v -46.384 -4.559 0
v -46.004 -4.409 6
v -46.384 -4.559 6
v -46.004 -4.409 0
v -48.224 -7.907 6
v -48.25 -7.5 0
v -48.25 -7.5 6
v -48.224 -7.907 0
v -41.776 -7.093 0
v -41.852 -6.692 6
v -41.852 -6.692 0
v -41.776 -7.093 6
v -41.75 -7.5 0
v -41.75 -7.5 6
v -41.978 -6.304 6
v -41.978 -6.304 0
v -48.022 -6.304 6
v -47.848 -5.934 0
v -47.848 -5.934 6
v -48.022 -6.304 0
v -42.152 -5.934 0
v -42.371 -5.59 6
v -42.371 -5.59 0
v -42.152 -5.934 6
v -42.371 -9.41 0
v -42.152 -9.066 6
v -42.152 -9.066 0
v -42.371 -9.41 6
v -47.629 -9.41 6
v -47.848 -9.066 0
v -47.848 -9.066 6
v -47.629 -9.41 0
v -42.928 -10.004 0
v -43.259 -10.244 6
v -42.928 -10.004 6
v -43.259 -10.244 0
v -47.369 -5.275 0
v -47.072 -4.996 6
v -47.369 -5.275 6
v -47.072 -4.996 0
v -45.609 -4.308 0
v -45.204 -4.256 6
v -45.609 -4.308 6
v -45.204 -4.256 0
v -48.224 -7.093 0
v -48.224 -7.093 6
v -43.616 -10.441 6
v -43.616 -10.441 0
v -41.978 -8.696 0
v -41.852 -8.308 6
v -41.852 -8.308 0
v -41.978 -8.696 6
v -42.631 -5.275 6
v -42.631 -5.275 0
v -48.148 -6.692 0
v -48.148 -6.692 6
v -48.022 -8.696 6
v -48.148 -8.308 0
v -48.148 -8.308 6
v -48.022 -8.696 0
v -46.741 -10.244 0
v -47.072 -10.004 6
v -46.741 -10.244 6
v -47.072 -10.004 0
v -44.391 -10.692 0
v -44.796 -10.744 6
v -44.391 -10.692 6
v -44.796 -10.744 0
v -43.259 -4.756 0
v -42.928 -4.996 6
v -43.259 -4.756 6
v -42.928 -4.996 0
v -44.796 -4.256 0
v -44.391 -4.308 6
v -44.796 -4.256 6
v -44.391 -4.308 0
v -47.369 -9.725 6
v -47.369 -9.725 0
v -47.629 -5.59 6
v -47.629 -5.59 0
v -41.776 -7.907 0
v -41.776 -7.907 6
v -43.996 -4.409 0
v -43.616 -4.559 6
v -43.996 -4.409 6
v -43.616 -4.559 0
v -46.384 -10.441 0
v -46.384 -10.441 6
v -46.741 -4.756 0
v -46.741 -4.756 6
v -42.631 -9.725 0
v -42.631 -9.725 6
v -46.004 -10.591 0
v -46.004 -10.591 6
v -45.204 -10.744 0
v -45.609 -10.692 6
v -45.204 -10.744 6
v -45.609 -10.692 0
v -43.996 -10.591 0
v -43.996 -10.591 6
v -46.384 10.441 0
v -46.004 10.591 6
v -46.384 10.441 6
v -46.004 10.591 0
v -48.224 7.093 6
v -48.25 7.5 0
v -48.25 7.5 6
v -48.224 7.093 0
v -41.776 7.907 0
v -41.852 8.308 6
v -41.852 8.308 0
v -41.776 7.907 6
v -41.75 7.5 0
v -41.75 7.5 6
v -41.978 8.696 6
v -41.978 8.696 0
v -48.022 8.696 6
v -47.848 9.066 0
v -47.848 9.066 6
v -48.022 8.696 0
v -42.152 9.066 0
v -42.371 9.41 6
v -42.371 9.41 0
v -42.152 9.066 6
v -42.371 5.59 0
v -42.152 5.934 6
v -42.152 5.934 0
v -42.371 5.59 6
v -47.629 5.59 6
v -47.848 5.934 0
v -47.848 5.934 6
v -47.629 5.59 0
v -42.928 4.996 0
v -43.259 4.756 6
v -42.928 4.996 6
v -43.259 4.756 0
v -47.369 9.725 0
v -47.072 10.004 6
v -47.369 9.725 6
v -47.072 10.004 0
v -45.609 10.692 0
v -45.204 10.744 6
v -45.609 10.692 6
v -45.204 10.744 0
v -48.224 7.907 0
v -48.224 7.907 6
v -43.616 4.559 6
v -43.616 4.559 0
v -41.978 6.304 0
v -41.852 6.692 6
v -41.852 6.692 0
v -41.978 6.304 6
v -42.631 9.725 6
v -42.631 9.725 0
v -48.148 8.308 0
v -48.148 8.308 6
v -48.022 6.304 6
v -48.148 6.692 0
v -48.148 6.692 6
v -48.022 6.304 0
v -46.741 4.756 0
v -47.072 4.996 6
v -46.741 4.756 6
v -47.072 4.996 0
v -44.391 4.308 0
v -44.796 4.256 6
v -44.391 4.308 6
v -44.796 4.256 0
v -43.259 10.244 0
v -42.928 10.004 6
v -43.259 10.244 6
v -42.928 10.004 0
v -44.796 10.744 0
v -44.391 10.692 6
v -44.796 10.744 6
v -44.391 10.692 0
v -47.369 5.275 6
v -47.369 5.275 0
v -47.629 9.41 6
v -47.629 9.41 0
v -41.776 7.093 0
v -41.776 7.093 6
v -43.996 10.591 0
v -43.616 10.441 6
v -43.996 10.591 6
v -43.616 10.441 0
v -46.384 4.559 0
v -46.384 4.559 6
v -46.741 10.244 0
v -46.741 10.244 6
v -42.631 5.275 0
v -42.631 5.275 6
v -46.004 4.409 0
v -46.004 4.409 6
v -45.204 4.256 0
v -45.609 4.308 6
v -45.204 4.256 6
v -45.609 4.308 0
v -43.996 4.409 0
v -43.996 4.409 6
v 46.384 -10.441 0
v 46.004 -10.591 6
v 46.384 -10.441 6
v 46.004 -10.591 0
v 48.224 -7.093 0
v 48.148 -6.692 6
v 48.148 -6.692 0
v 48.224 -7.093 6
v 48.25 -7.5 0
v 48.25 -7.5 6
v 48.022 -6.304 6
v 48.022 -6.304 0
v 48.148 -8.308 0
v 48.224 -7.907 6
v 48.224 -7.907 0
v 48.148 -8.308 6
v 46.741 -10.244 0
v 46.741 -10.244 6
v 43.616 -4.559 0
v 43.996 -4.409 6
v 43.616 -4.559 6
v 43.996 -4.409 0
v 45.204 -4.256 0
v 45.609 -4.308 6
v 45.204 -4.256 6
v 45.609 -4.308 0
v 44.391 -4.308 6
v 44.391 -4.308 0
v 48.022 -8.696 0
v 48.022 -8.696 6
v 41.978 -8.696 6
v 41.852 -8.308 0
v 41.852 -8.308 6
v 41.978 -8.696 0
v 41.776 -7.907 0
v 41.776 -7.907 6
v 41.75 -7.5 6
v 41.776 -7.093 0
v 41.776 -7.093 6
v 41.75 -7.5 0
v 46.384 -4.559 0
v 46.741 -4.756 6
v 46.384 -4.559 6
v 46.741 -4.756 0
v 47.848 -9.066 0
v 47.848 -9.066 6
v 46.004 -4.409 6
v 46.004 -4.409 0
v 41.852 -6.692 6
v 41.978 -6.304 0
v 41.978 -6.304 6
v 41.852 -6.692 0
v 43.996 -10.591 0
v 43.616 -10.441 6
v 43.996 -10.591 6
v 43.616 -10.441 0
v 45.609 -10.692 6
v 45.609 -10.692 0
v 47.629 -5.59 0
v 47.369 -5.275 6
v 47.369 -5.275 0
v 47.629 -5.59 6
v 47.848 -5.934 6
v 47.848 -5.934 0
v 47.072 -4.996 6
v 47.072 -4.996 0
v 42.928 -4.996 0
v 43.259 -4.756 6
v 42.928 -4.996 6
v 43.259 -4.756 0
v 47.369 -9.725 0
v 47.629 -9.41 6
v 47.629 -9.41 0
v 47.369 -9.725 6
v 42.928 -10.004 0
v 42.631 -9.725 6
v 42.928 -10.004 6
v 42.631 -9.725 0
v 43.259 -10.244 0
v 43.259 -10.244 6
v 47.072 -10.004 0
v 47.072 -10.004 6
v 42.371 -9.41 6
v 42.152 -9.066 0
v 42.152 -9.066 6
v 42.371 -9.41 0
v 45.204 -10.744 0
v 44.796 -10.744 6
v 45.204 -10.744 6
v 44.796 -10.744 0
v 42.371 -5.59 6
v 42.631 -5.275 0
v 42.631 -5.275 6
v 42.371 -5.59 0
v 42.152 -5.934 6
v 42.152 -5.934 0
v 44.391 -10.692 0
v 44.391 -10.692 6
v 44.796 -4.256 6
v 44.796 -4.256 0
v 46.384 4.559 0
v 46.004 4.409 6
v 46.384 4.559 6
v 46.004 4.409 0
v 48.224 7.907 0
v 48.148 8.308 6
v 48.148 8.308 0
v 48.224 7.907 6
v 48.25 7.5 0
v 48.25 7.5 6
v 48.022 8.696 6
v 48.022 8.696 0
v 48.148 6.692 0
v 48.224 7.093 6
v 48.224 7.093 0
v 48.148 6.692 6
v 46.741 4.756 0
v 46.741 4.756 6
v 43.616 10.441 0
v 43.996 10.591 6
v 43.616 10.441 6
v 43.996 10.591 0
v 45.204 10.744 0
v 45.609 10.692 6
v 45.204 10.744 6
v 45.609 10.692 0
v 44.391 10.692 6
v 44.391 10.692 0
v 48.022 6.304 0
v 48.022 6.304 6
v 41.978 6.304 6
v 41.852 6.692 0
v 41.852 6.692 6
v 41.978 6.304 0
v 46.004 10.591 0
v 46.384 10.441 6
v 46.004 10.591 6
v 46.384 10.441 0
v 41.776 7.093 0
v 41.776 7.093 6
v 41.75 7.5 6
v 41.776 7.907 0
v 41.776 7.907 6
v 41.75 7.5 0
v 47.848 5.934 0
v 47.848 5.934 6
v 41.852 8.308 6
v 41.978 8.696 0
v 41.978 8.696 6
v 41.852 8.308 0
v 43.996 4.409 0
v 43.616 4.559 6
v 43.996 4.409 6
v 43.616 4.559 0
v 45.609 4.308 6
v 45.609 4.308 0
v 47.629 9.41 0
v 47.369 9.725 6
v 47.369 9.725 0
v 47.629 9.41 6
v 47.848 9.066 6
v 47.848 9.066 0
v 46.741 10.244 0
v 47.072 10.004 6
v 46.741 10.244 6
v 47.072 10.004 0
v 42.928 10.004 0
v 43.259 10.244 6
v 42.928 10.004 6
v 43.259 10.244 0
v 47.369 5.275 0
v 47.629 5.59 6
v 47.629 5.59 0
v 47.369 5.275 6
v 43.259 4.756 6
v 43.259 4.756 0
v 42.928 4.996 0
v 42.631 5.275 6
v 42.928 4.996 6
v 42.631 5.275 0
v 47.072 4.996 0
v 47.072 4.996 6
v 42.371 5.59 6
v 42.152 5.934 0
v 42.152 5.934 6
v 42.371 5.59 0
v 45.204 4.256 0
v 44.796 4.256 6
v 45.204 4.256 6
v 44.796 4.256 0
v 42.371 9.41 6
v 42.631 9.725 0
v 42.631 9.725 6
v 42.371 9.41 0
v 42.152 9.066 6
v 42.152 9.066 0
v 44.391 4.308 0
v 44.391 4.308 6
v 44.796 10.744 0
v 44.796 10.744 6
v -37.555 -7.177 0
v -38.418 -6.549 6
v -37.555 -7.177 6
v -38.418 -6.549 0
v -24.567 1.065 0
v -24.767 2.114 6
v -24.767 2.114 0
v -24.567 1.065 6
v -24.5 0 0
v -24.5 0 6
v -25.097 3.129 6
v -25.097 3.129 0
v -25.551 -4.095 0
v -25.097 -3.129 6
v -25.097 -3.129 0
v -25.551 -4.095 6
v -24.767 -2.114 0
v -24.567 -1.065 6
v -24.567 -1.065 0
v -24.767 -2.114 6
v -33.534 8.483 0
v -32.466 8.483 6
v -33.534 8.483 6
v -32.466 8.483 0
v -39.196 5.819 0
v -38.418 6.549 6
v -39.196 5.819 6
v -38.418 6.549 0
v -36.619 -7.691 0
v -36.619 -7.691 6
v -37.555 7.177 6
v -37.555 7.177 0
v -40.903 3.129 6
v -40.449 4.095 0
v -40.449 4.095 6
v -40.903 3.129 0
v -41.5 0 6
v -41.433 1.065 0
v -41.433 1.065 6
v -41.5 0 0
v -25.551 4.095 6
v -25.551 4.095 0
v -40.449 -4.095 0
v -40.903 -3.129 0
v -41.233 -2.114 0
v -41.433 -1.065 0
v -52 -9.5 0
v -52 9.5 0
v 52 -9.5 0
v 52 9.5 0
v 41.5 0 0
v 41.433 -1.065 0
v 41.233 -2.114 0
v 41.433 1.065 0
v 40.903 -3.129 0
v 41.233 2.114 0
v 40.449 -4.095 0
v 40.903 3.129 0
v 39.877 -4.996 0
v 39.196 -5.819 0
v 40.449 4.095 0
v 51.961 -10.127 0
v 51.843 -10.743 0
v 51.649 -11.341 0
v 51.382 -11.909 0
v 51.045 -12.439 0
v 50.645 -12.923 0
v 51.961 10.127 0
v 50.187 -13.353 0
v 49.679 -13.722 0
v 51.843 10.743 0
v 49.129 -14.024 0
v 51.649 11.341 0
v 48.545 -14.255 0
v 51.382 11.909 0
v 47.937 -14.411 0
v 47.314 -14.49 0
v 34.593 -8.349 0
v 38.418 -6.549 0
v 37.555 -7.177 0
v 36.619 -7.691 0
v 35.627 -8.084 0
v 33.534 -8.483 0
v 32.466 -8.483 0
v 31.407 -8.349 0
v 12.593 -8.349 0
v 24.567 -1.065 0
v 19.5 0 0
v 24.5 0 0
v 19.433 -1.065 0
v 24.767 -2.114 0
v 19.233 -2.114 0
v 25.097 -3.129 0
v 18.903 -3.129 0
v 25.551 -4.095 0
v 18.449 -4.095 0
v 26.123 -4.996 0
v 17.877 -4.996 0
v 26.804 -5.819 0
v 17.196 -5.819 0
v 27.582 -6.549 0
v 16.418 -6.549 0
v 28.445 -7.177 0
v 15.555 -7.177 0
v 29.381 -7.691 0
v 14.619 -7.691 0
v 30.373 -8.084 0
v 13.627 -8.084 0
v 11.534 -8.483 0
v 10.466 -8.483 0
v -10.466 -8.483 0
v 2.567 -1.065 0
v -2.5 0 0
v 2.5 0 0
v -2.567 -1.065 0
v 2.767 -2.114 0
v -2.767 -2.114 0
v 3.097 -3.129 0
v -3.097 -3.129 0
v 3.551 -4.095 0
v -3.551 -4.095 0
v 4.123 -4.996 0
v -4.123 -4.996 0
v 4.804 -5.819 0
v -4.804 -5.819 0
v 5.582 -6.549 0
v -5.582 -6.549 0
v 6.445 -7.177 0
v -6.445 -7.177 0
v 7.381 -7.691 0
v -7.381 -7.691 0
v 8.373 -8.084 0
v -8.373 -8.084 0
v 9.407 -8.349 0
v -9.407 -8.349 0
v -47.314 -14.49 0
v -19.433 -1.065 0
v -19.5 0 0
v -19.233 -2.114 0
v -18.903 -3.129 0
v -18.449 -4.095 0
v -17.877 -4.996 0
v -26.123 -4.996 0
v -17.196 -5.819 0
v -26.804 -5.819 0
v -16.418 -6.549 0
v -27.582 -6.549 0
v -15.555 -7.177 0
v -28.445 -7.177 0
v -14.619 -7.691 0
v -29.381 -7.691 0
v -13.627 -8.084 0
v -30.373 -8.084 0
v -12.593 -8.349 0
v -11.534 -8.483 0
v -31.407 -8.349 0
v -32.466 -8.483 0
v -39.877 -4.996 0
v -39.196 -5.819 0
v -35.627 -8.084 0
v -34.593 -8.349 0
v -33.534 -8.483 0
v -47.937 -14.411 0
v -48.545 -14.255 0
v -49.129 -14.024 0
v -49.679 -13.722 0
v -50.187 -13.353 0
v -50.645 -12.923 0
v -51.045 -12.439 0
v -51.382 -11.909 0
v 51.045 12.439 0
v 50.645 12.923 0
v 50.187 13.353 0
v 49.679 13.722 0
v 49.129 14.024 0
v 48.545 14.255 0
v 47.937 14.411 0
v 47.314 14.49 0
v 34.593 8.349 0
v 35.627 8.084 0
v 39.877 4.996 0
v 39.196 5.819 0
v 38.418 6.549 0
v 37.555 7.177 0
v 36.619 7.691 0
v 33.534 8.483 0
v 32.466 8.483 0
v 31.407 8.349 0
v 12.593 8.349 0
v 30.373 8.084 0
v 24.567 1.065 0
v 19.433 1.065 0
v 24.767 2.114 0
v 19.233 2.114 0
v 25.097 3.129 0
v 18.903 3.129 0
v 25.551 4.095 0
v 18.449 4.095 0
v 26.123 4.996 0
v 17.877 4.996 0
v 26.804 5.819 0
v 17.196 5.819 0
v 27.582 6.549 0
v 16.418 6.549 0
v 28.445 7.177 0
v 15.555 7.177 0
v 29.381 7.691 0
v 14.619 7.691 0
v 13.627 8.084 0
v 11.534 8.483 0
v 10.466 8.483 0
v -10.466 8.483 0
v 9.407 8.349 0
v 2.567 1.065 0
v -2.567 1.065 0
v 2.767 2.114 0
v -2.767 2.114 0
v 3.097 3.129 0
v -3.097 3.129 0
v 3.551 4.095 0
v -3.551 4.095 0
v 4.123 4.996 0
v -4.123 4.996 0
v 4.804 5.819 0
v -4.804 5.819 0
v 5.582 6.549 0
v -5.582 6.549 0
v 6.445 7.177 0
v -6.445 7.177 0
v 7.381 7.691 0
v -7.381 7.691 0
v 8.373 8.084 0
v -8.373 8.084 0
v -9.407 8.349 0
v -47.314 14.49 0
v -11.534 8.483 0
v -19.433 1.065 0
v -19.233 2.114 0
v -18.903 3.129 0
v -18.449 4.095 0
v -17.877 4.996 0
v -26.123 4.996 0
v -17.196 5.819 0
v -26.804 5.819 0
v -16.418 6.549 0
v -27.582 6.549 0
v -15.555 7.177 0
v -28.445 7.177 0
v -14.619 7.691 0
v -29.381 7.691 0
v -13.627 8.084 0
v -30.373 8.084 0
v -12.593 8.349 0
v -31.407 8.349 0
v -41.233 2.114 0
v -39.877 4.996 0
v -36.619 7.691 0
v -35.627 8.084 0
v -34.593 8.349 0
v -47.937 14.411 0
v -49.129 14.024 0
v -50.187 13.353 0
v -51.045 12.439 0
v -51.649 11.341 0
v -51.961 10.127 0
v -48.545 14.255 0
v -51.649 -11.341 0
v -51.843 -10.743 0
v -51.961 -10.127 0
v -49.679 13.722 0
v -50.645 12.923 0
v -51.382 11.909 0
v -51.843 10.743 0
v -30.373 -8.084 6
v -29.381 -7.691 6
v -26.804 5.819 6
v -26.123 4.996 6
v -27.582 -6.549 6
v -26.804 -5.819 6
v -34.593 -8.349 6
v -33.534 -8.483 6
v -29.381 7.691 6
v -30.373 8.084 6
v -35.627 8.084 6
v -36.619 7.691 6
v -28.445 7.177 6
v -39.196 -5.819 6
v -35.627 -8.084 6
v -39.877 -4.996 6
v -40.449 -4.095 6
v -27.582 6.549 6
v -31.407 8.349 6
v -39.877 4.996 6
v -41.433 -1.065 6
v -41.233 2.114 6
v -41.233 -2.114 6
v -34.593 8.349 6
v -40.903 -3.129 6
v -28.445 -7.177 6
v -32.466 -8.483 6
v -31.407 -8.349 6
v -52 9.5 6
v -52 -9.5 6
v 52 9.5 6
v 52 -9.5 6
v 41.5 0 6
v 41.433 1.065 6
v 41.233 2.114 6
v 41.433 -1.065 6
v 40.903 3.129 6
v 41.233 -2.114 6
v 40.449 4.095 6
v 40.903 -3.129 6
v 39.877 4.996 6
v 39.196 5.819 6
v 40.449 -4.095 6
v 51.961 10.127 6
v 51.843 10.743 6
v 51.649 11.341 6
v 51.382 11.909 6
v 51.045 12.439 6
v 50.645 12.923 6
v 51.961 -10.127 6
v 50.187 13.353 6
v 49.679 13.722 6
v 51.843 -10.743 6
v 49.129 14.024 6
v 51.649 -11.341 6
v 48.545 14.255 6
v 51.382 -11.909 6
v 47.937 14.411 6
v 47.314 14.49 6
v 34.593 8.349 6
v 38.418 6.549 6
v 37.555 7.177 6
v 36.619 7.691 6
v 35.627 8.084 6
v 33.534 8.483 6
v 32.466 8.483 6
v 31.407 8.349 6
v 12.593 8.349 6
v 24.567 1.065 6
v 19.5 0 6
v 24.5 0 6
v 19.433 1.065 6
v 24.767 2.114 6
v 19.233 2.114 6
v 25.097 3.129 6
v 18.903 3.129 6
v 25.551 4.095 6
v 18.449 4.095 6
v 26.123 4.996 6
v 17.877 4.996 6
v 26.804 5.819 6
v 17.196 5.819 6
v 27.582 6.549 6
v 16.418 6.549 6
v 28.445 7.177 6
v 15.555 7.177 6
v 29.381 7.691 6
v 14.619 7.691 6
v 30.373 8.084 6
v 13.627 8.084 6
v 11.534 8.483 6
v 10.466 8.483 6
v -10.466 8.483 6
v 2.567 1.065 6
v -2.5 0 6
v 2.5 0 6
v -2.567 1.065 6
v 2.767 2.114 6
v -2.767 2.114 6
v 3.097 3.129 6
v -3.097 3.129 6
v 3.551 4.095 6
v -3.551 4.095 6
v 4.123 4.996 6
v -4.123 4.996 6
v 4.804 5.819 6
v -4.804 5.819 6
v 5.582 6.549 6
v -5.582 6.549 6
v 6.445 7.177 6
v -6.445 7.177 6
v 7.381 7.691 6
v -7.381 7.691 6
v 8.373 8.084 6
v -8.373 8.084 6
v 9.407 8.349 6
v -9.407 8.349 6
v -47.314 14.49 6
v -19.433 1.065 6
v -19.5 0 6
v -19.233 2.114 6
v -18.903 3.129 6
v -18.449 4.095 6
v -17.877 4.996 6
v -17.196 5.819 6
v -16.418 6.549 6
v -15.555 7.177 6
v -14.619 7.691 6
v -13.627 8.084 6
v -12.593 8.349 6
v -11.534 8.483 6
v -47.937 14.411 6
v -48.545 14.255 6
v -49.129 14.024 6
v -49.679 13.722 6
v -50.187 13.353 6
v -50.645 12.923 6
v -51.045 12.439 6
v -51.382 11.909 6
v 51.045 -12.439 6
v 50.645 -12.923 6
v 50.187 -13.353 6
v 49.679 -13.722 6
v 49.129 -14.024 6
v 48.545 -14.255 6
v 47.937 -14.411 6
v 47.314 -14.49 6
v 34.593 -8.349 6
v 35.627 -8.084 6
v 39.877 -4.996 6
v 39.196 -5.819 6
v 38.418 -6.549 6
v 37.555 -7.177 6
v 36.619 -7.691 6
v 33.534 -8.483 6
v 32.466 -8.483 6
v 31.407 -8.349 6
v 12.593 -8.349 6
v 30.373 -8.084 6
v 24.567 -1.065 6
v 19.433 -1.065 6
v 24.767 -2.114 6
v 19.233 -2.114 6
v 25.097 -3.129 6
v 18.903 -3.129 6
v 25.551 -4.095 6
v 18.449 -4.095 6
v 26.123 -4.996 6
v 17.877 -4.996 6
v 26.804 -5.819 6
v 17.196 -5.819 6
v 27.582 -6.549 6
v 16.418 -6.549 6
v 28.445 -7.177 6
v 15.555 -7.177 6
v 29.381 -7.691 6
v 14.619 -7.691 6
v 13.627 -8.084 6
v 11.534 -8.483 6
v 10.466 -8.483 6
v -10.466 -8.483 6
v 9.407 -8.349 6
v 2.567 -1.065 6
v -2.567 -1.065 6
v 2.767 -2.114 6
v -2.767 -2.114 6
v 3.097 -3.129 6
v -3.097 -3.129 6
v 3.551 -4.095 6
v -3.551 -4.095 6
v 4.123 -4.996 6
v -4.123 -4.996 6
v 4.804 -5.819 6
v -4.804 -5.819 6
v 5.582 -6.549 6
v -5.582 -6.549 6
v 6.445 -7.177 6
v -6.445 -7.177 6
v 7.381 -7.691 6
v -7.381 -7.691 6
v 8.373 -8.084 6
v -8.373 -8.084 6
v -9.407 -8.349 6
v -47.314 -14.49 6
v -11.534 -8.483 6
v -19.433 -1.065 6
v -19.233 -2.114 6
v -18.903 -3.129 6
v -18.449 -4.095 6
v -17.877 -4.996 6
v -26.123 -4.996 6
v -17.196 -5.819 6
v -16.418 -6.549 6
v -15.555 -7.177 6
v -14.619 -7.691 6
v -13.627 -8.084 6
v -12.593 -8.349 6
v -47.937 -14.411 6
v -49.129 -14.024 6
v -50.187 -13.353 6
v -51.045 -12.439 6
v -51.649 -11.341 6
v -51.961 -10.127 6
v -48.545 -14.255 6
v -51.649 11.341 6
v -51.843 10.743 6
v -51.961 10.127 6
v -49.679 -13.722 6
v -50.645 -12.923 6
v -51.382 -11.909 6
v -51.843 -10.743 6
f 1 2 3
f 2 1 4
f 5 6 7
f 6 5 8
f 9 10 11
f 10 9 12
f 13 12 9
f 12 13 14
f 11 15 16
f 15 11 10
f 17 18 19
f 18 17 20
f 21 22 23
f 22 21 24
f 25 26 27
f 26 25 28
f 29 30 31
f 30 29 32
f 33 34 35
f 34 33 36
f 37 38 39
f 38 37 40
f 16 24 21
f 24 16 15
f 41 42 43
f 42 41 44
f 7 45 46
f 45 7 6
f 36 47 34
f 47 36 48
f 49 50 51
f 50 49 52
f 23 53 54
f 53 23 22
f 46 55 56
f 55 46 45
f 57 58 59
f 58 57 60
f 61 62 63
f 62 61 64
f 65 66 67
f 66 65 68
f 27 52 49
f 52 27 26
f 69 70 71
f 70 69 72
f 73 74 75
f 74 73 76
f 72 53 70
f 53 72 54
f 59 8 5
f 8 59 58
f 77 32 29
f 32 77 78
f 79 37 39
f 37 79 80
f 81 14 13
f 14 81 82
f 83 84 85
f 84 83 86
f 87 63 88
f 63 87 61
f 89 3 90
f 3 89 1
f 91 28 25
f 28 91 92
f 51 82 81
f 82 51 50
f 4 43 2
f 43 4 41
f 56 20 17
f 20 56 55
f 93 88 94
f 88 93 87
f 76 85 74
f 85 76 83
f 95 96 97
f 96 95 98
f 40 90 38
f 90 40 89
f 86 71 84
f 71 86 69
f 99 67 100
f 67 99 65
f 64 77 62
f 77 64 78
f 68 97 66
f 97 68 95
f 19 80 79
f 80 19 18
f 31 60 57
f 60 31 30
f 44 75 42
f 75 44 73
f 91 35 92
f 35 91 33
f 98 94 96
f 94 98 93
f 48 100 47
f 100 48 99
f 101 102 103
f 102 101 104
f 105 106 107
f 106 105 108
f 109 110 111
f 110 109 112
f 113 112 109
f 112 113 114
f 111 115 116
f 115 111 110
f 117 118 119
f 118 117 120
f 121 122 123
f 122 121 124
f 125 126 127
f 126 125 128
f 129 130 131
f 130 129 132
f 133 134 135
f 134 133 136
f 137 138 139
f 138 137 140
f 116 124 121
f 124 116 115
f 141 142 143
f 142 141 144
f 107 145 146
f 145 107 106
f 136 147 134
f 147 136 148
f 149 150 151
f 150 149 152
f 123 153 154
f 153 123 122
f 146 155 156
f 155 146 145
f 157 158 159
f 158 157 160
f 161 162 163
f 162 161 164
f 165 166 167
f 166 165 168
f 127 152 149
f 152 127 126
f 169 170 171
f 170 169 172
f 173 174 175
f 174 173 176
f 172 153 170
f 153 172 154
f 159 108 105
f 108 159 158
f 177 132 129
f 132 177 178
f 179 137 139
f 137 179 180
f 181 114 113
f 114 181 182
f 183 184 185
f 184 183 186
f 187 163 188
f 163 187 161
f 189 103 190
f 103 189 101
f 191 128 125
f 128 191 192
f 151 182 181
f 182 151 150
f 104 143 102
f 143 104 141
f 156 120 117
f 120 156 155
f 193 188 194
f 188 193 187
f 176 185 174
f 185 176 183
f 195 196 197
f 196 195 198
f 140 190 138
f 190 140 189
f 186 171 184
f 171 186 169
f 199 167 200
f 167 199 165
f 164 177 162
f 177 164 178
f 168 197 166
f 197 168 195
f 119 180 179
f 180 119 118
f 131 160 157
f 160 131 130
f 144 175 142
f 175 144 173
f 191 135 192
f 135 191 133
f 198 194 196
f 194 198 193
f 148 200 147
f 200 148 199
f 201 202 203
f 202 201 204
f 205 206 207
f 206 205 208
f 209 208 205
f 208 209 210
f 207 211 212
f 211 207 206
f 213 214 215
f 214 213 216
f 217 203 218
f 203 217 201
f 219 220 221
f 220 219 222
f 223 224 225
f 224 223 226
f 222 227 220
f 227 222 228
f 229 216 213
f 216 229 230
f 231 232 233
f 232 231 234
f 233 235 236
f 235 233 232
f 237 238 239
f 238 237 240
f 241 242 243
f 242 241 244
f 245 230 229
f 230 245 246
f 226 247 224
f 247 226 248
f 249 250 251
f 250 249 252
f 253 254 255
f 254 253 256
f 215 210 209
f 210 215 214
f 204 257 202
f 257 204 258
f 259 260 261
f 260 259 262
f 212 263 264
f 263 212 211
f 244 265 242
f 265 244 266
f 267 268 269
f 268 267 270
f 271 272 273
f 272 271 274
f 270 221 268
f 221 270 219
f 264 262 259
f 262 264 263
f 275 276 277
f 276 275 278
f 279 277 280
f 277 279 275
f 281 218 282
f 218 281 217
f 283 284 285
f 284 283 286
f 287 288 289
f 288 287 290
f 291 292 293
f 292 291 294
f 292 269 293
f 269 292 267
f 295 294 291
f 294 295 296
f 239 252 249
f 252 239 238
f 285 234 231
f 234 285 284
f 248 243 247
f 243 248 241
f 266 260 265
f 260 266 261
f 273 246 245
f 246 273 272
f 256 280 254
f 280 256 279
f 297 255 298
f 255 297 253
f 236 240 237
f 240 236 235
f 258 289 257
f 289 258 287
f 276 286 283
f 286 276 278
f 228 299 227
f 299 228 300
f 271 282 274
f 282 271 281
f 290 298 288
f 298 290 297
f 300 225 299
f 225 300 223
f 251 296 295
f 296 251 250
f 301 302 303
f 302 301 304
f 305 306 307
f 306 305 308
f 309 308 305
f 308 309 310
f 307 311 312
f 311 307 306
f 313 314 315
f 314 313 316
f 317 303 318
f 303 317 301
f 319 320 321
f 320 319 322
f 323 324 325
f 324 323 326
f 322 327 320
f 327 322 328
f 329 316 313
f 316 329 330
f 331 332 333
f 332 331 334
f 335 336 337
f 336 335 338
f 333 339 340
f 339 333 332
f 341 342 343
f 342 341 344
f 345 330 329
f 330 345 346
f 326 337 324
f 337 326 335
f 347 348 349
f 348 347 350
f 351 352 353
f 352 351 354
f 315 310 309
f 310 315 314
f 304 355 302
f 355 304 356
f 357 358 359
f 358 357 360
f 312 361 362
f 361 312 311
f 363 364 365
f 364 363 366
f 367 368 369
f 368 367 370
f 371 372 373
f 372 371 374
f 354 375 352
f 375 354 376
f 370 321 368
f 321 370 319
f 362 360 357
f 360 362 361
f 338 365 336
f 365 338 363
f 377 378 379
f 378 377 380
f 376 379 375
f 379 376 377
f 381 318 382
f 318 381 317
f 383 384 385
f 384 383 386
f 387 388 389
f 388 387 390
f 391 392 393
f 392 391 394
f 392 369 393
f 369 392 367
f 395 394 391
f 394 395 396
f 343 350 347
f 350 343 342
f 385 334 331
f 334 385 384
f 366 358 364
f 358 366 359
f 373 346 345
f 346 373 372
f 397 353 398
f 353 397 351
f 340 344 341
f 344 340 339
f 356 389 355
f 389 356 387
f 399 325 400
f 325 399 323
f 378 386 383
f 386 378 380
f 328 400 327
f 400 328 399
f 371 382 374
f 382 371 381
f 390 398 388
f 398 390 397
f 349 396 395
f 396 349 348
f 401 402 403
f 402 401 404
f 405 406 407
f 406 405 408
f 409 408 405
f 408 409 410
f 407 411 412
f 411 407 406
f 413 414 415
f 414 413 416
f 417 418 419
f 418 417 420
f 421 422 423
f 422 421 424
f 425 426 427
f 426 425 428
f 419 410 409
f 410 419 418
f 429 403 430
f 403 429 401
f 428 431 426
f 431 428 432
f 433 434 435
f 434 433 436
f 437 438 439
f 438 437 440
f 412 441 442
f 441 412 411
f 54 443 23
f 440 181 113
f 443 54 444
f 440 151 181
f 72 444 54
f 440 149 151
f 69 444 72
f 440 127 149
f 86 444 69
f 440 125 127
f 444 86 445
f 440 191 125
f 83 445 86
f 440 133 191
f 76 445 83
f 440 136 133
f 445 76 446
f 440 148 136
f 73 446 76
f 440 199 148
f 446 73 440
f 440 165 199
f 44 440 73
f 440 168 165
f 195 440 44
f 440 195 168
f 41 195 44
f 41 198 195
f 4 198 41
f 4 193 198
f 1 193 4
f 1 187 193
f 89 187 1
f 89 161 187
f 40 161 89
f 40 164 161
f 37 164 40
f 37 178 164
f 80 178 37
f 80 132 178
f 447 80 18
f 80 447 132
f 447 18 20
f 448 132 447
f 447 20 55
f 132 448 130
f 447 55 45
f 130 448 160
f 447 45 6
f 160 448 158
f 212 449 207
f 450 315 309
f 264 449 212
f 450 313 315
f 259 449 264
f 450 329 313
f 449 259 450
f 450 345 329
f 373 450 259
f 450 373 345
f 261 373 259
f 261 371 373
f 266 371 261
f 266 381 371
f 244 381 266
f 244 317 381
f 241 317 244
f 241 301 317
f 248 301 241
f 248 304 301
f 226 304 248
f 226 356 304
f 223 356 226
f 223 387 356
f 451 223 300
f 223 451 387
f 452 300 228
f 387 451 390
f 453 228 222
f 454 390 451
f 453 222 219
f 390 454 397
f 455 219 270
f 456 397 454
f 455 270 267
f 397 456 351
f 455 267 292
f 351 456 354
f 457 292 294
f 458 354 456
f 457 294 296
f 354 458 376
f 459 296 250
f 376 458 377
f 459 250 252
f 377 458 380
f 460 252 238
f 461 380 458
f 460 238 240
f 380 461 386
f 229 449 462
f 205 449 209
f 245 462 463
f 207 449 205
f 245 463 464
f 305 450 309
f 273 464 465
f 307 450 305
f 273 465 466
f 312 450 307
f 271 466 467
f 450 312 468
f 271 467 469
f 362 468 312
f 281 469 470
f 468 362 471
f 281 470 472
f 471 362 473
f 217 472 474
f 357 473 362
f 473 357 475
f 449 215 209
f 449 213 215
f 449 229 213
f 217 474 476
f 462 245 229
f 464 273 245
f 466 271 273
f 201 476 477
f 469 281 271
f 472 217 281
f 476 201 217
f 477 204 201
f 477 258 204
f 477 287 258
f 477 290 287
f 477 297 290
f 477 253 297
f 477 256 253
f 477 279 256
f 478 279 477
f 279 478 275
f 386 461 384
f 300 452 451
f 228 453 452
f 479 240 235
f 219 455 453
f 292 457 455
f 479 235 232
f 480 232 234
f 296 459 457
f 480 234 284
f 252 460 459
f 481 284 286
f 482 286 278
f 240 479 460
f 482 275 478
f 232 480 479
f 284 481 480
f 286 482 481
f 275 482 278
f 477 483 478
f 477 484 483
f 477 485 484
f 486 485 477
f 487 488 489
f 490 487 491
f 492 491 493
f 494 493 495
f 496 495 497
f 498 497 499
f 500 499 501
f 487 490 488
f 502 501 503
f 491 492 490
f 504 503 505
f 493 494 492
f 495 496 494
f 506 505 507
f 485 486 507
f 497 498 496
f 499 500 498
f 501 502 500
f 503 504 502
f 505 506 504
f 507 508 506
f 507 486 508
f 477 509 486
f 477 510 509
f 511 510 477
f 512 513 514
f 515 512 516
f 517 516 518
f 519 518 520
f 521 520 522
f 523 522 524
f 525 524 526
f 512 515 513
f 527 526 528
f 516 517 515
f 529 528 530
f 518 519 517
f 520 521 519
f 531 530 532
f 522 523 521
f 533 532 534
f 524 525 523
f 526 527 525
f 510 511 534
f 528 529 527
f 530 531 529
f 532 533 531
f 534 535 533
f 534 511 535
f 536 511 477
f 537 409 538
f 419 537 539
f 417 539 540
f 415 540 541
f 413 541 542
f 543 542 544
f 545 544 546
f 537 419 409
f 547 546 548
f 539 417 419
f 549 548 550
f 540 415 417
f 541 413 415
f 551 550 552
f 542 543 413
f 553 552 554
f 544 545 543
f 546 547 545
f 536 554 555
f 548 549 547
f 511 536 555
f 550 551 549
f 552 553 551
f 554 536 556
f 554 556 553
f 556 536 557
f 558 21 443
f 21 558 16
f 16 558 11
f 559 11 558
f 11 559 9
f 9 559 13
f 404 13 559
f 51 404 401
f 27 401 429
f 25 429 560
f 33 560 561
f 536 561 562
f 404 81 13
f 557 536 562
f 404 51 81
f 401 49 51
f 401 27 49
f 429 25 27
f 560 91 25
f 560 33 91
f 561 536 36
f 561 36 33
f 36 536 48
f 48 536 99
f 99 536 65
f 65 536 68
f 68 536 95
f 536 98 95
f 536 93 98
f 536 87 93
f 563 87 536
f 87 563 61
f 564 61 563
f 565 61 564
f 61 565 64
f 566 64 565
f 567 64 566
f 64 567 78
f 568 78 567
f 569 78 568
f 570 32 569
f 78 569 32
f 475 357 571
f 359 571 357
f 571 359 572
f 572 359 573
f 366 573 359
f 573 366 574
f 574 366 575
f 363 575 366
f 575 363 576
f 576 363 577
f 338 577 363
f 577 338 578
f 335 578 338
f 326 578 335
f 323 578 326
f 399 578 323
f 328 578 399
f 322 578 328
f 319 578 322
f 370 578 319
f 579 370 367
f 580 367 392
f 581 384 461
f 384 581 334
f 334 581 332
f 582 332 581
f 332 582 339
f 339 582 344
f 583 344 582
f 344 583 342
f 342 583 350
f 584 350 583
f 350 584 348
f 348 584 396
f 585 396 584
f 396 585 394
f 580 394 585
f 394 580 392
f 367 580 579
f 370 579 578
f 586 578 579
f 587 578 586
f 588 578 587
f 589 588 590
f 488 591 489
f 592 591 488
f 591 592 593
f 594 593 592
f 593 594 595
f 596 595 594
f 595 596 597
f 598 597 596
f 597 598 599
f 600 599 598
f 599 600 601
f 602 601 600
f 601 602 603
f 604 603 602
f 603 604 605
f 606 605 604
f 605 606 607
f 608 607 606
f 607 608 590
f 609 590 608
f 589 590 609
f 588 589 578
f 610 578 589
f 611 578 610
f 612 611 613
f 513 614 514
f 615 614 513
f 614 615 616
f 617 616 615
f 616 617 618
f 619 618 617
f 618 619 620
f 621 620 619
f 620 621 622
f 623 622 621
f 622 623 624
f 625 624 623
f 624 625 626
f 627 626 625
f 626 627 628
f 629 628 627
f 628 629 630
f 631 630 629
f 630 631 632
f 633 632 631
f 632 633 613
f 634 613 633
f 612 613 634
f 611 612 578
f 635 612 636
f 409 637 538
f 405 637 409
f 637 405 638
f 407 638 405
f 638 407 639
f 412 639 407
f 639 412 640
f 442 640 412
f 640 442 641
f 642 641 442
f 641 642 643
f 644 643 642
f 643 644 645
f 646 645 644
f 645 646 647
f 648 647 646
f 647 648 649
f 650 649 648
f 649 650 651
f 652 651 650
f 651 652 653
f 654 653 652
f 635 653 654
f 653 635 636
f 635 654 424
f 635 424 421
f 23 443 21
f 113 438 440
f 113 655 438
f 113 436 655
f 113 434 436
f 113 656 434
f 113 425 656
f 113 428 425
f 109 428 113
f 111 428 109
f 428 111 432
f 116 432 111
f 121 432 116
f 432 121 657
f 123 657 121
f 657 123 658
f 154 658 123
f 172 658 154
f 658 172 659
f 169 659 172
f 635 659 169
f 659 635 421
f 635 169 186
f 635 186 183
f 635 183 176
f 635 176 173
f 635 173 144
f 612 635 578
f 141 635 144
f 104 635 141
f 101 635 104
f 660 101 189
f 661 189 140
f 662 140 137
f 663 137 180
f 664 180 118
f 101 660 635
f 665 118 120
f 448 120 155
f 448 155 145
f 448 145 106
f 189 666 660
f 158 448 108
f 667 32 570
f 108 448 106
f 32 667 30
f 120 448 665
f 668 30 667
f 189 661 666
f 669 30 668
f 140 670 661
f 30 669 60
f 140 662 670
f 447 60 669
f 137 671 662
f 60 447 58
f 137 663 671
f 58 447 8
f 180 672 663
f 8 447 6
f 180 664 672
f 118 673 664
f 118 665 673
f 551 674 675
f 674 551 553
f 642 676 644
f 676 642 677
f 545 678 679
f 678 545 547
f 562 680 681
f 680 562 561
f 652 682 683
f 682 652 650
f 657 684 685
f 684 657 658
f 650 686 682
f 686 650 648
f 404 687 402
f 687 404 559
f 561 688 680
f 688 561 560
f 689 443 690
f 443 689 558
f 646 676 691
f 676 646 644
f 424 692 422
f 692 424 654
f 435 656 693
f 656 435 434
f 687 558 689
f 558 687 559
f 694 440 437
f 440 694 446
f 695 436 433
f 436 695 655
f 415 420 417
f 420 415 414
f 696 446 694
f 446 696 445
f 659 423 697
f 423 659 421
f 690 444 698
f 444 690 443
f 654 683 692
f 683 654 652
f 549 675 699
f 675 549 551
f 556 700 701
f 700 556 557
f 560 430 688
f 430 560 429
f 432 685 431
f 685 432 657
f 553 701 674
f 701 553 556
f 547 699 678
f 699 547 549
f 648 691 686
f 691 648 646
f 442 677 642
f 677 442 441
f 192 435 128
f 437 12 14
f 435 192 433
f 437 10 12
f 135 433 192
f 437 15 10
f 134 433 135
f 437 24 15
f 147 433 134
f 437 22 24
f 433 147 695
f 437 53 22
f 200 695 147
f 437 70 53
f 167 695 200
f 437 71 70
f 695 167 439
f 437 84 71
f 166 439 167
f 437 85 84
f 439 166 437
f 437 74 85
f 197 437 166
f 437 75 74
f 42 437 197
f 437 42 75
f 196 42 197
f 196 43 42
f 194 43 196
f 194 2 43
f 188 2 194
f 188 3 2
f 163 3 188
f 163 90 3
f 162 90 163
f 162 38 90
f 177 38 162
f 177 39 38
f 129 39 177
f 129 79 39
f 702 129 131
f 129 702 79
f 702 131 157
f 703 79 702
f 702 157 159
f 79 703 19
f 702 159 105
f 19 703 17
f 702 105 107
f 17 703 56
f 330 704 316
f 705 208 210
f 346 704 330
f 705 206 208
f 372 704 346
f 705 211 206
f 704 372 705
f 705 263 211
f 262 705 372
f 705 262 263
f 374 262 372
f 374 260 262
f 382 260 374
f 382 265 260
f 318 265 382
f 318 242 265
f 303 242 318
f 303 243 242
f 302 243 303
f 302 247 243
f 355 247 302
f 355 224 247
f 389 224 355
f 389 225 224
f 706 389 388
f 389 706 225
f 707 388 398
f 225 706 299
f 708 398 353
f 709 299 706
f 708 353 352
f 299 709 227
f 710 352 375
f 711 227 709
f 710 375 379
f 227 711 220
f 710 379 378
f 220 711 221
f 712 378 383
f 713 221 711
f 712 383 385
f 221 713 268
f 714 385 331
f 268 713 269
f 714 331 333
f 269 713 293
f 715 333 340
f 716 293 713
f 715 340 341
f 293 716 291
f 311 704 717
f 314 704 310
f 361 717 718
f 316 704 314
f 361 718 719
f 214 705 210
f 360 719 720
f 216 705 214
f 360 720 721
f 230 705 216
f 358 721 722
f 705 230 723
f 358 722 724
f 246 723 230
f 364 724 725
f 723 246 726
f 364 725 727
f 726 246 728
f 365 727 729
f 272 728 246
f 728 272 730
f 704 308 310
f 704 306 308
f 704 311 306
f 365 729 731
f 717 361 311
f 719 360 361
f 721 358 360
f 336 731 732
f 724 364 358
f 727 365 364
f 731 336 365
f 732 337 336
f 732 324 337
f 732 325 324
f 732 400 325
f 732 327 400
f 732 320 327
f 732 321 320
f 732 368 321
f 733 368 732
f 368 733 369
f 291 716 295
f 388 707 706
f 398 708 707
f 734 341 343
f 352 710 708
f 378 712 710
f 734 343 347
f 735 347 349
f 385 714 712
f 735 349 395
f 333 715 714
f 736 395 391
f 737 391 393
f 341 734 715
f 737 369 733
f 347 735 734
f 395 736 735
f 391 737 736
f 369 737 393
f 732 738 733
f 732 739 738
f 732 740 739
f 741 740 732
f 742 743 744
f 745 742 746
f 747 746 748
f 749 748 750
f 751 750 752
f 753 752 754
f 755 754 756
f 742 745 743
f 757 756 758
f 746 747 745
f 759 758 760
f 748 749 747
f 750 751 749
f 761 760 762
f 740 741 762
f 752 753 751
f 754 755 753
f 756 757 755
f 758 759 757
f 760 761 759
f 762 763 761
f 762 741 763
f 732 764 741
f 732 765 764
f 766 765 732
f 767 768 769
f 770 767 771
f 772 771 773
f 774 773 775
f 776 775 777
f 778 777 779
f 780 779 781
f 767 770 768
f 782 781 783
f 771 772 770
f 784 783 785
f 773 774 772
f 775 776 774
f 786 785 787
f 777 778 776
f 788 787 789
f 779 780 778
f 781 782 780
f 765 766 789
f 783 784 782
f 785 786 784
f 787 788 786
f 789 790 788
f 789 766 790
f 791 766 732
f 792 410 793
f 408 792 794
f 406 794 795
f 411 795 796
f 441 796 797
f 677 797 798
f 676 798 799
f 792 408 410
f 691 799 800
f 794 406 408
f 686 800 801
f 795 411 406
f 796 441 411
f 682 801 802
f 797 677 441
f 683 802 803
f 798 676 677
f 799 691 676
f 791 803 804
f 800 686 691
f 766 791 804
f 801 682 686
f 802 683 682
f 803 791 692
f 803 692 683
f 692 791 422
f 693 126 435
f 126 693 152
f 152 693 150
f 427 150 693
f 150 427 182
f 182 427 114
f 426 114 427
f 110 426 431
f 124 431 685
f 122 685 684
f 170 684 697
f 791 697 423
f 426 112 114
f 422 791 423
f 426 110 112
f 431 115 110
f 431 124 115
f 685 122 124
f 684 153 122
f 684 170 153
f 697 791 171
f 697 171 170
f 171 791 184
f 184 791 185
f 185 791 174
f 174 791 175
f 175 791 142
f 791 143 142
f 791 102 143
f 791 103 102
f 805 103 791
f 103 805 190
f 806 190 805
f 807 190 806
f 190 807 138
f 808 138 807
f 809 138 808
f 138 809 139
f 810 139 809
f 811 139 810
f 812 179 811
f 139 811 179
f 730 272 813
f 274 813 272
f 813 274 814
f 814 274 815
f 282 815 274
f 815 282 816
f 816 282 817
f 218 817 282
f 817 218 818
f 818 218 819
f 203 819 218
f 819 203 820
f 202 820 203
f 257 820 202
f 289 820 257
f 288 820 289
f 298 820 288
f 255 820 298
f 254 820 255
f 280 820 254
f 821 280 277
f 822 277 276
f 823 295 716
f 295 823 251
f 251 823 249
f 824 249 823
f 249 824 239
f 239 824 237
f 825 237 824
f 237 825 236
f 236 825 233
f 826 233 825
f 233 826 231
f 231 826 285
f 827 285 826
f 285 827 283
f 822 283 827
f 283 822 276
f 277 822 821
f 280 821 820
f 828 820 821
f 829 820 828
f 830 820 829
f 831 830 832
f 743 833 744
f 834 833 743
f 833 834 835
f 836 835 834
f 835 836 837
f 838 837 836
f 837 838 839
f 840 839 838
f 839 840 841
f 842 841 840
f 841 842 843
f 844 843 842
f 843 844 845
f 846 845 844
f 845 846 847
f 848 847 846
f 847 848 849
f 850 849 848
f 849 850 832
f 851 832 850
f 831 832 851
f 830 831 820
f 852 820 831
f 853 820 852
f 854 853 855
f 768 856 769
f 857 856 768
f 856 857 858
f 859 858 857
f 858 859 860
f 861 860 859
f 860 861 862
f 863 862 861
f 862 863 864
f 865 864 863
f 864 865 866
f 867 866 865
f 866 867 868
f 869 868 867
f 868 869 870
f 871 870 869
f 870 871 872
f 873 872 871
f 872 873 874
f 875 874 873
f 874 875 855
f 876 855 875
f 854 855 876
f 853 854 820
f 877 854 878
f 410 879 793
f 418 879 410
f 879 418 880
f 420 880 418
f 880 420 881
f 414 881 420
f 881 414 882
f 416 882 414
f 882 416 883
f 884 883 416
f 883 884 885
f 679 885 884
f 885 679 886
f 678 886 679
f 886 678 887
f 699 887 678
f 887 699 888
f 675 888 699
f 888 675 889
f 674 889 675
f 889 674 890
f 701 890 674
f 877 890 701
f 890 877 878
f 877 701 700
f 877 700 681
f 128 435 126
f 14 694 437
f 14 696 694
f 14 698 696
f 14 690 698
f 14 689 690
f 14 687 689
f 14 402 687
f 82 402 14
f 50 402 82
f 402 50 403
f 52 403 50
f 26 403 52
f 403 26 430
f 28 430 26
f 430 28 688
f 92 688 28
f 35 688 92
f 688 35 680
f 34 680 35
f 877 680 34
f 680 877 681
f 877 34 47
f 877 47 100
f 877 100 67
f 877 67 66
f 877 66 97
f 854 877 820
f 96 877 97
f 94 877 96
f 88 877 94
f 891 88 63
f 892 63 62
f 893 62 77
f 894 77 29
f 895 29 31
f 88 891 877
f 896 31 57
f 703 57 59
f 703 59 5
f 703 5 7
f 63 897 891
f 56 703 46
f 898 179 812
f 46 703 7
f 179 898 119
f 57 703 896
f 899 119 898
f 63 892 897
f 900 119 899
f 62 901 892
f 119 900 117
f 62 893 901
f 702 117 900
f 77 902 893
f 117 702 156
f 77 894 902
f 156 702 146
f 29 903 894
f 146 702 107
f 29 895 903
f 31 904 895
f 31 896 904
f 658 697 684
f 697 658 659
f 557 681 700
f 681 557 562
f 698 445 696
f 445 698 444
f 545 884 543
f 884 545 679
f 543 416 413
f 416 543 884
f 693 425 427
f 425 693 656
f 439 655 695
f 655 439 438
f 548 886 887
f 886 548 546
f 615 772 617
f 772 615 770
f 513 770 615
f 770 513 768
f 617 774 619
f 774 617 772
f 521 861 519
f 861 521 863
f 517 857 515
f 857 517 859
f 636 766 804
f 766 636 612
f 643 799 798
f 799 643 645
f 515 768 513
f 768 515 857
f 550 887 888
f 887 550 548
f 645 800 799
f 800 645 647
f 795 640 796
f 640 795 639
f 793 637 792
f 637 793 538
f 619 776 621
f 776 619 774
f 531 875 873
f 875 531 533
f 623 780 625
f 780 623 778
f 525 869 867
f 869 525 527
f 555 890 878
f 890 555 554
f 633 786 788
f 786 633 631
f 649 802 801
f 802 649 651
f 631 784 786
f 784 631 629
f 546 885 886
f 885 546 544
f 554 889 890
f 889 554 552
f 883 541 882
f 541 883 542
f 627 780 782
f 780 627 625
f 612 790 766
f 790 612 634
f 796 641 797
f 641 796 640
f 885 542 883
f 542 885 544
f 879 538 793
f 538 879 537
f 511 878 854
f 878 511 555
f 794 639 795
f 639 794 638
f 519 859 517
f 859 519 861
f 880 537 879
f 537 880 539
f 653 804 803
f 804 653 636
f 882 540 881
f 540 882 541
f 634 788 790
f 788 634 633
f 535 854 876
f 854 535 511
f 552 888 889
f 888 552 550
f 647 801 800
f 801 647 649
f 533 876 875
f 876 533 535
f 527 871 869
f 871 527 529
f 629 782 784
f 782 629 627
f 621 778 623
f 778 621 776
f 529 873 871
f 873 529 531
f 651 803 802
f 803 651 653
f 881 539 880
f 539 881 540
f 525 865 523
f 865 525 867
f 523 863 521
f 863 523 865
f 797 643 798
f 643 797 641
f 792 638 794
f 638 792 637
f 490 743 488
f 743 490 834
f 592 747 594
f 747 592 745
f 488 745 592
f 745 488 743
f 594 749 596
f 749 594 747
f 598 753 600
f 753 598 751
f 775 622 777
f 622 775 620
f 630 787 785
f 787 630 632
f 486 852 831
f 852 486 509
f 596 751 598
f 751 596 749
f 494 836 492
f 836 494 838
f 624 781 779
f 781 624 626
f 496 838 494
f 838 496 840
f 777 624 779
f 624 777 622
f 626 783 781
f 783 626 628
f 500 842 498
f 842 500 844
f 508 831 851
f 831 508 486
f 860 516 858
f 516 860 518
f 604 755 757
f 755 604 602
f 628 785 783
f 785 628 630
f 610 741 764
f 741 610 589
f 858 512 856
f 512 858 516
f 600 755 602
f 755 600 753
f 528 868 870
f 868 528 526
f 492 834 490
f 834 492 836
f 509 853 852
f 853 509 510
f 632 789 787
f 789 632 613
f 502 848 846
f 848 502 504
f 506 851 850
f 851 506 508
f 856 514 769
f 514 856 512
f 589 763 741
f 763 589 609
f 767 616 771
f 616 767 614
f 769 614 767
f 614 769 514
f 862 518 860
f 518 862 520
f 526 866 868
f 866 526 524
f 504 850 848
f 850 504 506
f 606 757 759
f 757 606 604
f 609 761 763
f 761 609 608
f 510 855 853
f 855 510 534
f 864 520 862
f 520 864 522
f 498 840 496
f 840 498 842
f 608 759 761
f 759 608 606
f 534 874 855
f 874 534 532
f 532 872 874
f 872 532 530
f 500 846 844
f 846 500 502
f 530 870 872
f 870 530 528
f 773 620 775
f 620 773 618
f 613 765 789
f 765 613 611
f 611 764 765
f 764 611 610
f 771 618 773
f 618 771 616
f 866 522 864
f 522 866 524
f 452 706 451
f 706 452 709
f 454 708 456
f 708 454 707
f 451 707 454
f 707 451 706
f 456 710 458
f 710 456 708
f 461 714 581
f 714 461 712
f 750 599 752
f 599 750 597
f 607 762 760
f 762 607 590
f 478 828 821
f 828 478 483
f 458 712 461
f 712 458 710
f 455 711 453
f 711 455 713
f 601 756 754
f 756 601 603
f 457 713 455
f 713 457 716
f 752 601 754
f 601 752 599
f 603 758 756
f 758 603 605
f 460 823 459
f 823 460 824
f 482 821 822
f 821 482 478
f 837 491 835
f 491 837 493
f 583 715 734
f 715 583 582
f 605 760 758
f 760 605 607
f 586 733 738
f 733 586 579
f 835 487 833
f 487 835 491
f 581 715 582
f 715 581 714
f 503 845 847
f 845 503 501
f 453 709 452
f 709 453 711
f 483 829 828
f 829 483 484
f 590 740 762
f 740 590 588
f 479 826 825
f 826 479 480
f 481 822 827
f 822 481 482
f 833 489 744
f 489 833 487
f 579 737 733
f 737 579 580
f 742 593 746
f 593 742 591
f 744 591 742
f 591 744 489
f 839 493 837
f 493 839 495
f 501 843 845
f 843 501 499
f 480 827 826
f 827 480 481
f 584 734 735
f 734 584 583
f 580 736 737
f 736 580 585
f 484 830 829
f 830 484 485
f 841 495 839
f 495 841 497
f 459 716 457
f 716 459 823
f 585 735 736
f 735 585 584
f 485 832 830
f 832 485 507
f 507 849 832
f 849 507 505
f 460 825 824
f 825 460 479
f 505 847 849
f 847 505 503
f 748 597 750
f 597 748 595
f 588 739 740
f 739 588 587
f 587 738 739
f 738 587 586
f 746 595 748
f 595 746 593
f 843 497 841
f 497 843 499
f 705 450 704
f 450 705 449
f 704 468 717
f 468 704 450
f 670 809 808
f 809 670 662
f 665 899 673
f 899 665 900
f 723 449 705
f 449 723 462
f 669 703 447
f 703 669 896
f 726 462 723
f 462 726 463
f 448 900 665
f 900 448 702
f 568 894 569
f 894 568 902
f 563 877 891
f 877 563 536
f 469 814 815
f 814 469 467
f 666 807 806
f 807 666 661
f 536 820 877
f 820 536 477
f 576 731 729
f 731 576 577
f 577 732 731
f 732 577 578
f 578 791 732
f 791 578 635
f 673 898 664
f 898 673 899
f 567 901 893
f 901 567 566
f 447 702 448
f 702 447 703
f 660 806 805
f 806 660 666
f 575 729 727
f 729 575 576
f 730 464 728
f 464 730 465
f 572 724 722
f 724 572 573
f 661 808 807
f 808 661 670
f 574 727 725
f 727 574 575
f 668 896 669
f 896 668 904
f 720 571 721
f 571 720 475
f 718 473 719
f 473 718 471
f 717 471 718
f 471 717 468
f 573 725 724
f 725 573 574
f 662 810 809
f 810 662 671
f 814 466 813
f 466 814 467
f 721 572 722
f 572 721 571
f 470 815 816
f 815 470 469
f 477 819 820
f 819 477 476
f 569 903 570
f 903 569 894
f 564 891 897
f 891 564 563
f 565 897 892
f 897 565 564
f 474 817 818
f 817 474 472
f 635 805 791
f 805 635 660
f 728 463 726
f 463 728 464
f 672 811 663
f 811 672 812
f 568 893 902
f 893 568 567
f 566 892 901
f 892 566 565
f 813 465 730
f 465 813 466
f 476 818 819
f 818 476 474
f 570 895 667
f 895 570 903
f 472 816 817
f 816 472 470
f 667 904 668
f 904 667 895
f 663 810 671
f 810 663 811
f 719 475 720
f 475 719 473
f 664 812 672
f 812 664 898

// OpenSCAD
$fn = 50;


difference() {
	union() {
		hull() {
			translate(v = [-47.0000000000, 9.5000000000, 0]) {
				cylinder(h = 6, r = 5);
			}
			translate(v = [47.0000000000, 9.5000000000, 0]) {
				cylinder(h = 6, r = 5);
			}
			translate(v = [-47.0000000000, -9.5000000000, 0]) {
				cylinder(h = 6, r = 5);
			}
			translate(v = [47.0000000000, -9.5000000000, 0]) {
				cylinder(h = 6, r = 5);
			}
		}
	}
	union() {
		#translate(v = [-45.0000000000, -7.5000000000, -100.0000000000]) {
			cylinder(h = 200, r = 3.2500000000);
		}
		#translate(v = [-45.0000000000, 7.5000000000, -100.0000000000]) {
			cylinder(h = 200, r = 3.2500000000);
		}
		#translate(v = [45.0000000000, -7.5000000000, -100.0000000000]) {
			cylinder(h = 200, r = 3.2500000000);
		}
		#translate(v = [45.0000000000, 7.5000000000, -100.0000000000]) {
			cylinder(h = 200, r = 3.2500000000);
		}
		#translate(v = [-33.0000000000, 0, 0]) {
			cylinder(h = 6, r = 8.5000000000);
		}
		#translate(v = [-11.0000000000, 0, 0]) {
			cylinder(h = 6, r = 8.5000000000);
		}
		#translate(v = [11.0000000000, 0, 0]) {
			cylinder(h = 6, r = 8.5000000000);
		}
		#translate(v = [33.0000000000, 0, 0]) {
			cylinder(h = 6, r = 8.5000000000);
		}
	}
}
